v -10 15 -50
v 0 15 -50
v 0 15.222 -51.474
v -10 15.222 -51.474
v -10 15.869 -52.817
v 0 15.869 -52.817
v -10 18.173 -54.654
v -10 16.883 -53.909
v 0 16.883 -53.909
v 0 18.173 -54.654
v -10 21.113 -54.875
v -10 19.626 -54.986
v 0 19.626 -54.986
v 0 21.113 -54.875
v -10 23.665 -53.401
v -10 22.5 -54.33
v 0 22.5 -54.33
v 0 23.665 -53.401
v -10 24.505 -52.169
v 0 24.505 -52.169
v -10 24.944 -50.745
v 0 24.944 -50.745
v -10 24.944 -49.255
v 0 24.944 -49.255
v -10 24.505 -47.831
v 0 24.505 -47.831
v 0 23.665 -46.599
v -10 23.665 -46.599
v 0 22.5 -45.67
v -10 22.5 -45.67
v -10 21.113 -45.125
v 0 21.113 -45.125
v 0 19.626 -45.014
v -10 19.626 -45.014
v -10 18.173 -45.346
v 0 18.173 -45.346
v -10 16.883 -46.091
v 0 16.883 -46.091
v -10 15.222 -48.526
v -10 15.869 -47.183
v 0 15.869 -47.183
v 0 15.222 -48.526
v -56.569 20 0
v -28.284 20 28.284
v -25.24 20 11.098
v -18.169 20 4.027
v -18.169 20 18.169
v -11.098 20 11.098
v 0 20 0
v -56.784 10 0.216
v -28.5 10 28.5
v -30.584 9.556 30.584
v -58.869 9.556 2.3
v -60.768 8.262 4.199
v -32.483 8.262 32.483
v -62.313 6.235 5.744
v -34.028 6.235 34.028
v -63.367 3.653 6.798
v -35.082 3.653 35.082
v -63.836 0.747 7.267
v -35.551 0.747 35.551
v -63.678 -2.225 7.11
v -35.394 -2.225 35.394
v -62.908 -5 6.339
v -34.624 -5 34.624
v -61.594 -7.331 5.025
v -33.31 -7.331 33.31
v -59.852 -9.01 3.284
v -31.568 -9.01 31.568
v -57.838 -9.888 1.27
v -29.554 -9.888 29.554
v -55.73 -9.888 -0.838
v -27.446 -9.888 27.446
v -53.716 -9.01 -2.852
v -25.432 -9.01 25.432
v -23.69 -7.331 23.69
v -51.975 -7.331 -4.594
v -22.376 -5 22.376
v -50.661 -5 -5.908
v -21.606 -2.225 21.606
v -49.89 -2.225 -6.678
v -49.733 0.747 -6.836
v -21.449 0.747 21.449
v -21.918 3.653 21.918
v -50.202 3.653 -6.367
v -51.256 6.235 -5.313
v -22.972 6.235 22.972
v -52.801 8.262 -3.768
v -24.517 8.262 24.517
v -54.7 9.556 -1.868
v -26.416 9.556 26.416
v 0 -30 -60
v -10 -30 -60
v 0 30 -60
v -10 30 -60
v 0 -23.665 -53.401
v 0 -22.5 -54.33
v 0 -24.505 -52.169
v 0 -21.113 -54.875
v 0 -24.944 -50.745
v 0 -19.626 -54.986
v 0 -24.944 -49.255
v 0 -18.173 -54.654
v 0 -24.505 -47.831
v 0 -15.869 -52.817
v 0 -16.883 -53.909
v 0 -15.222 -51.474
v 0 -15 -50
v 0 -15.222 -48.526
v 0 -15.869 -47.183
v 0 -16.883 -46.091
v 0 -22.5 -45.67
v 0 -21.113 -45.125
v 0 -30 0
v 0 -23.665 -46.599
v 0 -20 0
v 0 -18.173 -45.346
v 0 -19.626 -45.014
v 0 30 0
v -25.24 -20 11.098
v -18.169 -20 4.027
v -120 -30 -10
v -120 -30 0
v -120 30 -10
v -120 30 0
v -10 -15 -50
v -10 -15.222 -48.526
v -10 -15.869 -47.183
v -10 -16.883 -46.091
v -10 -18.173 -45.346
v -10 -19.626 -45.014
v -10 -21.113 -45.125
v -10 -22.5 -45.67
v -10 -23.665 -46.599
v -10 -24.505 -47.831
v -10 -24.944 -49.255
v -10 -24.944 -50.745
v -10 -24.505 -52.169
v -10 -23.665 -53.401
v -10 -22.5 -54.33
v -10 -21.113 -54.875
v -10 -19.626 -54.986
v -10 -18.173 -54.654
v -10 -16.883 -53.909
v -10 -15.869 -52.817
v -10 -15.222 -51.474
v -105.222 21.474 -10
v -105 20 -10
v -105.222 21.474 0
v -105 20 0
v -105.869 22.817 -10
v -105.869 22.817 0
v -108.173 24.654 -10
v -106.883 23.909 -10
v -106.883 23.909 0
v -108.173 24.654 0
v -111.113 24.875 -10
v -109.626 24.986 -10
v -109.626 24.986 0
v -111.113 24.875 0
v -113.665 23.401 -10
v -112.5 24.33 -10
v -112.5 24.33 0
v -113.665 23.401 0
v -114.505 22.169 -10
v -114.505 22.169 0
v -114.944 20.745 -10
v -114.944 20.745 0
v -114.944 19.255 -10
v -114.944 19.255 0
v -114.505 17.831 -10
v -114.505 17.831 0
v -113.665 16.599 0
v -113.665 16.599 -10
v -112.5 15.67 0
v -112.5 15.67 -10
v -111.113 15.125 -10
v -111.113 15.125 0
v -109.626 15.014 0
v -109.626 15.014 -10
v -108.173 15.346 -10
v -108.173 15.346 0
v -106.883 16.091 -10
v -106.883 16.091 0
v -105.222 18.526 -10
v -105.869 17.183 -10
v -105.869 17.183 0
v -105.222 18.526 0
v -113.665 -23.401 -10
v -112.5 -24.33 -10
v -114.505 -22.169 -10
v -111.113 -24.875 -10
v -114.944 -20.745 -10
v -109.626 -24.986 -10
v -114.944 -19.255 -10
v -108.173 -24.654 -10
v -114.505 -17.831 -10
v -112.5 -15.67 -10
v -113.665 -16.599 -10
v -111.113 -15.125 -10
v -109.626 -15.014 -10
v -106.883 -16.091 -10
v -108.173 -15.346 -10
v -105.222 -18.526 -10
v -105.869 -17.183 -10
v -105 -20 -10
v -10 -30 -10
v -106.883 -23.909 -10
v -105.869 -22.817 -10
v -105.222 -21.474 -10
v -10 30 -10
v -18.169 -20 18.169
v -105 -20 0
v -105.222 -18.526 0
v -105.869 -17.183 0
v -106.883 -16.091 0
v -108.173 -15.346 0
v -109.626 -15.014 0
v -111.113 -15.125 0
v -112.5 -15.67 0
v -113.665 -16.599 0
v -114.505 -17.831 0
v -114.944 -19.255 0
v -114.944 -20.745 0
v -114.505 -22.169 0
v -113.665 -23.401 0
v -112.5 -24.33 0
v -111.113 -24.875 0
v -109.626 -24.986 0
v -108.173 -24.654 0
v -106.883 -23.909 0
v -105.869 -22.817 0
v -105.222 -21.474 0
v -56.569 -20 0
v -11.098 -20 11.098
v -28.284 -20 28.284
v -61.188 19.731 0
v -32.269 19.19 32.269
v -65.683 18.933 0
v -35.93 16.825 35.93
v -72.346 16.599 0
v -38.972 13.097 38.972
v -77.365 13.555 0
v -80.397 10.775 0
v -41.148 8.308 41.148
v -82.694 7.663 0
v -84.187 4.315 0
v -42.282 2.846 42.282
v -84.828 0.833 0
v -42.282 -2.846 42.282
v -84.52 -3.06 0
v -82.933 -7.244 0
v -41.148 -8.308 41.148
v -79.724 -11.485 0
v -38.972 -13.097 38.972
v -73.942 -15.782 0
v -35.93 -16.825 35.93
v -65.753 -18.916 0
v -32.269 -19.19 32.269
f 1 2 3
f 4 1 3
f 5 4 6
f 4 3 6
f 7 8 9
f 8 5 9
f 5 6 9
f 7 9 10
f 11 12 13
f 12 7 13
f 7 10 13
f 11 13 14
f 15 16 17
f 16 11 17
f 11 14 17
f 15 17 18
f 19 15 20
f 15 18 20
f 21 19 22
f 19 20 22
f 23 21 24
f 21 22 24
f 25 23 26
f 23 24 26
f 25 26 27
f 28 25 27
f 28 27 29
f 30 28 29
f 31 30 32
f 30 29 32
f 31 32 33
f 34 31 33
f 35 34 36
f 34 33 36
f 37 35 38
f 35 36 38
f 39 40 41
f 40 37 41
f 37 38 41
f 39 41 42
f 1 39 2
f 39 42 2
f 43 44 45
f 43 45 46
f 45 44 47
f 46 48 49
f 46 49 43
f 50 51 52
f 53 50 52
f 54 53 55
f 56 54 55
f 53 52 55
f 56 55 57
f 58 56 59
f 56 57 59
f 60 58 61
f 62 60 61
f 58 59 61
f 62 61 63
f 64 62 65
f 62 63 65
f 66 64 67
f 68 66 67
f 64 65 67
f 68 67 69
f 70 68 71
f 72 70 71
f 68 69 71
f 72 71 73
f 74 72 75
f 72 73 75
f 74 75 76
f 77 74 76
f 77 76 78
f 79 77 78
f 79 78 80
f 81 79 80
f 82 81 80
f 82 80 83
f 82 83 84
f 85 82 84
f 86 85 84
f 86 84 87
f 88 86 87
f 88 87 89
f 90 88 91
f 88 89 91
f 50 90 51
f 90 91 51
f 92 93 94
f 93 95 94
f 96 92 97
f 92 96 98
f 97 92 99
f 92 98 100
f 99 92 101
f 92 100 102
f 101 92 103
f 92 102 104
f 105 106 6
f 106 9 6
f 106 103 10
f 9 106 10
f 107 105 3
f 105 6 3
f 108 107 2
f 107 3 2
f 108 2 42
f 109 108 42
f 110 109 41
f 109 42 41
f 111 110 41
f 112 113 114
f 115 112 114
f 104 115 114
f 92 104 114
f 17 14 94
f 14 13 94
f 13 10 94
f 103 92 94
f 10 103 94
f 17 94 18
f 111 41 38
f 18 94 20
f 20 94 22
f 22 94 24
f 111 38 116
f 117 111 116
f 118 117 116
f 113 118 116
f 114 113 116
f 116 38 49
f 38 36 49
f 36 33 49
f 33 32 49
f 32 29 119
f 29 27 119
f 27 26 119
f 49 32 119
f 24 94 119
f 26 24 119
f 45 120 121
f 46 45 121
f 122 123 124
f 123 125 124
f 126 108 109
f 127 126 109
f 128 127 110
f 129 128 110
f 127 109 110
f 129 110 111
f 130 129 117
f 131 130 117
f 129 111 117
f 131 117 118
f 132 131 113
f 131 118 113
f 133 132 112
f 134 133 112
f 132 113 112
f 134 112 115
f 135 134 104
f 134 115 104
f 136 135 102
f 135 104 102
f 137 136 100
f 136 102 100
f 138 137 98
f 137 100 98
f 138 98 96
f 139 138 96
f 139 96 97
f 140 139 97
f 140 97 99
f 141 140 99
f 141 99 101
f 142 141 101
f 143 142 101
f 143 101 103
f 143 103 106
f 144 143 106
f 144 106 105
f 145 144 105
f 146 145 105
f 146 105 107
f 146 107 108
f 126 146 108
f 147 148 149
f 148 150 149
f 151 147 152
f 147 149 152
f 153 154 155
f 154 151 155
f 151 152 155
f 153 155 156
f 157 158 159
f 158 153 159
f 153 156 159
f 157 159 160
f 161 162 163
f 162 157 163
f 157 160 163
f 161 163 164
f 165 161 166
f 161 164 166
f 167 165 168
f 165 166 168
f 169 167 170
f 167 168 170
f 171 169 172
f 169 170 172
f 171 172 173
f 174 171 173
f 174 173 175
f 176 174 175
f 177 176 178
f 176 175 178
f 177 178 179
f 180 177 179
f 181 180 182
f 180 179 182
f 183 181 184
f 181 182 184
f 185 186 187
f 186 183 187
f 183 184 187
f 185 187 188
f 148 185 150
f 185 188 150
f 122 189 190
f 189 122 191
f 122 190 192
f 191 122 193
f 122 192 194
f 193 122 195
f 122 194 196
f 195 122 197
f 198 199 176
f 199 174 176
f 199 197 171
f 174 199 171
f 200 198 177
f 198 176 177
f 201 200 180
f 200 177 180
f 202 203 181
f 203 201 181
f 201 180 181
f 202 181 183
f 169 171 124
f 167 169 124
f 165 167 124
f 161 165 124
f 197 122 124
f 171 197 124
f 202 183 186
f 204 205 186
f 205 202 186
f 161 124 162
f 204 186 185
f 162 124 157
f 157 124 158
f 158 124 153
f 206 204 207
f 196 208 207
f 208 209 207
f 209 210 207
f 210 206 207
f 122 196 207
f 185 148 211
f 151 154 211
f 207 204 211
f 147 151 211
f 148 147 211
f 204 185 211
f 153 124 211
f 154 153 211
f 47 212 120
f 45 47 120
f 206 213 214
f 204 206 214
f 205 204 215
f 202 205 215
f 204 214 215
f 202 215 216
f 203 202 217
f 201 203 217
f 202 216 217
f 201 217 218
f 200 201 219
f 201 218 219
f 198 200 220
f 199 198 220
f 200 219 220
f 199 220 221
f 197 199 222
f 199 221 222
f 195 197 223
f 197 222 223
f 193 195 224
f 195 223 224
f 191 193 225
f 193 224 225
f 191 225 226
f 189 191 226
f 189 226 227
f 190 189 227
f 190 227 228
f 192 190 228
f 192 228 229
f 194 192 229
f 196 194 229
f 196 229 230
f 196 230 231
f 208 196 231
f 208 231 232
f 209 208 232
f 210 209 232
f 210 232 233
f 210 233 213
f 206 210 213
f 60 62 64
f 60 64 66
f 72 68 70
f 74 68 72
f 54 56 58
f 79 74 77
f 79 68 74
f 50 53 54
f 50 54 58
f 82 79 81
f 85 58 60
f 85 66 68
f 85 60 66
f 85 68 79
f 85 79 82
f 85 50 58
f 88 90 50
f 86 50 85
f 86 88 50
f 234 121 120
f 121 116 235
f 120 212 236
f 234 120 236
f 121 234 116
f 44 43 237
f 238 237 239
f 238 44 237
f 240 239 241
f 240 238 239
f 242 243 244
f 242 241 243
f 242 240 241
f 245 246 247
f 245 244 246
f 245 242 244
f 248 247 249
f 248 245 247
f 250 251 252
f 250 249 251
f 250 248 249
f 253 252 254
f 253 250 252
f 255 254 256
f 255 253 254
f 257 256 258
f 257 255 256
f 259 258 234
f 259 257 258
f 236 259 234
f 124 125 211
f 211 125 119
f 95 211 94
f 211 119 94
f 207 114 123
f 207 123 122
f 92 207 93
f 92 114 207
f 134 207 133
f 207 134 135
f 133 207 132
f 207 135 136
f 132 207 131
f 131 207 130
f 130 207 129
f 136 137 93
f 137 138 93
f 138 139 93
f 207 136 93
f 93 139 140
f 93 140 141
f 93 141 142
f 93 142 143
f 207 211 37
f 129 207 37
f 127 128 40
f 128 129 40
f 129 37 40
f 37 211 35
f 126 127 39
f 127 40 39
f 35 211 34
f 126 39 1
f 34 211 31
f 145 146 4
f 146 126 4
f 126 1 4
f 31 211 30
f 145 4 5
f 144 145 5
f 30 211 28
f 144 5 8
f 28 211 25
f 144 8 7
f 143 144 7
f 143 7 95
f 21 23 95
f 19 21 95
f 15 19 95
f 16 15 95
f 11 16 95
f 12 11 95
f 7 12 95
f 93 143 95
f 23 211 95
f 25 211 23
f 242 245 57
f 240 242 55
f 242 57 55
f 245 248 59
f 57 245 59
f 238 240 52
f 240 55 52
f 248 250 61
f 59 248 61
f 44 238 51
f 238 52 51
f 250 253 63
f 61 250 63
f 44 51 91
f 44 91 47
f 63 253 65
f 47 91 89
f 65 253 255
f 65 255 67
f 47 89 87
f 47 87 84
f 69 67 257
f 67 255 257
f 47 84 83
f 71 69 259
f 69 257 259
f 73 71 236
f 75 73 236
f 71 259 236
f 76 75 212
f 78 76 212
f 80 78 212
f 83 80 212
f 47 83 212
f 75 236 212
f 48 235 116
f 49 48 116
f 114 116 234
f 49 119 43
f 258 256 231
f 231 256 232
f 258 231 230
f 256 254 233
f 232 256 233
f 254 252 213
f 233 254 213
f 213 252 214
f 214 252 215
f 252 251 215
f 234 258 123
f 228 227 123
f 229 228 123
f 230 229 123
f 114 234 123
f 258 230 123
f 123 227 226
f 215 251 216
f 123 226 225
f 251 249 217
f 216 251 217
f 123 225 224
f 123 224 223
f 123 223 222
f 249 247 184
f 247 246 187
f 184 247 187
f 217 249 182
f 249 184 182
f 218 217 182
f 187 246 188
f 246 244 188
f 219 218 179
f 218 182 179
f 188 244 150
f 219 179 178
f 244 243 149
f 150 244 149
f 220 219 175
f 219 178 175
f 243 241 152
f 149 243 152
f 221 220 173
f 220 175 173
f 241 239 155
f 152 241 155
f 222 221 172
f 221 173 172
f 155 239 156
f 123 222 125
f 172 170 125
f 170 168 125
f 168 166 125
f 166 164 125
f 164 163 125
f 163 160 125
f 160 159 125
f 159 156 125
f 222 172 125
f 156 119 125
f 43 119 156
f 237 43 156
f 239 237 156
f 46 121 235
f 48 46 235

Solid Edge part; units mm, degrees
sketch "Sketch1" plane through (0, 0, 0) normal (0, -1, 0) x (1, 0, 0)
  line L0 (0, 0) -> (-120, 0)
  line L1 (-120, 0) -> (-120, -10)
  line L2 (-120, -10) -> (-10, -10)
  line L3 (-10, -10) -> (-10, -60)
  line L4 (-10, -60) -> (0, -60)
  line L5 (0, -60) -> (0, 0)
extrude "Protrusion1" add sketch "Sketch1" along normal mid plane 60
sketch "Sketch2" plane through (-42.4264, 0, 42.4264) normal (0.7071068, 0, 0.7071068) x (0, -1, 0)
  line L0 (20, 60) -> (20, 20)
  line L1 (0, 60) -> (20, 60)
  line L2 (-20, 60) -> (0, 60)
  line L3 (-20, 20) -> (-20, 60)
  arc A0 (-20, 20) -> (20, 20) centre (0, 20) ccw
extrude "Protrusion2" add sketch "Sketch2" against normal up to next
sketch "Sketch3" plane through (-21.2132, 0, 21.2132) normal (0.7071068, 0, 0.7071068) x (0, 1, 0)
  circle A0 centre (0, 10.3051) radius 10
extrude "ExtrudedCutout_1" cut sketch "Sketch3" against normal blind 40
sketch "Sketch4" plane through (-28.2843, -20, 14.1421) normal (0, -1, 0) x (1, 0, 0)
  line L0 (10.1152, 4.0269) -> (3.0442, -3.0442)
  line L1 (3.0442, -3.0442) -> (10.1152, -10.1152)
  line L2 (10.1152, -10.1152) -> (17.1863, -3.0442)
  line L3 (17.1863, -3.0442) -> (10.1152, 4.0269)
extrude "Cutout1" cut sketch "Sketch4" against normal up to surface (40 mm away)
sketch "Sketch5" plane through (-60, 0, 0) normal (0, 0, 1) x (1, 0, 0)
  circle A0 centre (-50, -20) radius 5
extrude "Cutout2" cut sketch "Sketch5" against normal up to surface (10 mm away)
sketch "Sketch6" plane through (0, 0, -30) normal (1, 0, 0) x (0, 1, 0)
  circle A0 centre (-20, -20) radius 5
extrude "Cutout3" cut sketch "Sketch6" against normal up to surface (10 mm away)
mirror "Mirror1" about plane through (0, 0, 0) normal (0, -1, 0) of "Cutout2", "Cutout3"
